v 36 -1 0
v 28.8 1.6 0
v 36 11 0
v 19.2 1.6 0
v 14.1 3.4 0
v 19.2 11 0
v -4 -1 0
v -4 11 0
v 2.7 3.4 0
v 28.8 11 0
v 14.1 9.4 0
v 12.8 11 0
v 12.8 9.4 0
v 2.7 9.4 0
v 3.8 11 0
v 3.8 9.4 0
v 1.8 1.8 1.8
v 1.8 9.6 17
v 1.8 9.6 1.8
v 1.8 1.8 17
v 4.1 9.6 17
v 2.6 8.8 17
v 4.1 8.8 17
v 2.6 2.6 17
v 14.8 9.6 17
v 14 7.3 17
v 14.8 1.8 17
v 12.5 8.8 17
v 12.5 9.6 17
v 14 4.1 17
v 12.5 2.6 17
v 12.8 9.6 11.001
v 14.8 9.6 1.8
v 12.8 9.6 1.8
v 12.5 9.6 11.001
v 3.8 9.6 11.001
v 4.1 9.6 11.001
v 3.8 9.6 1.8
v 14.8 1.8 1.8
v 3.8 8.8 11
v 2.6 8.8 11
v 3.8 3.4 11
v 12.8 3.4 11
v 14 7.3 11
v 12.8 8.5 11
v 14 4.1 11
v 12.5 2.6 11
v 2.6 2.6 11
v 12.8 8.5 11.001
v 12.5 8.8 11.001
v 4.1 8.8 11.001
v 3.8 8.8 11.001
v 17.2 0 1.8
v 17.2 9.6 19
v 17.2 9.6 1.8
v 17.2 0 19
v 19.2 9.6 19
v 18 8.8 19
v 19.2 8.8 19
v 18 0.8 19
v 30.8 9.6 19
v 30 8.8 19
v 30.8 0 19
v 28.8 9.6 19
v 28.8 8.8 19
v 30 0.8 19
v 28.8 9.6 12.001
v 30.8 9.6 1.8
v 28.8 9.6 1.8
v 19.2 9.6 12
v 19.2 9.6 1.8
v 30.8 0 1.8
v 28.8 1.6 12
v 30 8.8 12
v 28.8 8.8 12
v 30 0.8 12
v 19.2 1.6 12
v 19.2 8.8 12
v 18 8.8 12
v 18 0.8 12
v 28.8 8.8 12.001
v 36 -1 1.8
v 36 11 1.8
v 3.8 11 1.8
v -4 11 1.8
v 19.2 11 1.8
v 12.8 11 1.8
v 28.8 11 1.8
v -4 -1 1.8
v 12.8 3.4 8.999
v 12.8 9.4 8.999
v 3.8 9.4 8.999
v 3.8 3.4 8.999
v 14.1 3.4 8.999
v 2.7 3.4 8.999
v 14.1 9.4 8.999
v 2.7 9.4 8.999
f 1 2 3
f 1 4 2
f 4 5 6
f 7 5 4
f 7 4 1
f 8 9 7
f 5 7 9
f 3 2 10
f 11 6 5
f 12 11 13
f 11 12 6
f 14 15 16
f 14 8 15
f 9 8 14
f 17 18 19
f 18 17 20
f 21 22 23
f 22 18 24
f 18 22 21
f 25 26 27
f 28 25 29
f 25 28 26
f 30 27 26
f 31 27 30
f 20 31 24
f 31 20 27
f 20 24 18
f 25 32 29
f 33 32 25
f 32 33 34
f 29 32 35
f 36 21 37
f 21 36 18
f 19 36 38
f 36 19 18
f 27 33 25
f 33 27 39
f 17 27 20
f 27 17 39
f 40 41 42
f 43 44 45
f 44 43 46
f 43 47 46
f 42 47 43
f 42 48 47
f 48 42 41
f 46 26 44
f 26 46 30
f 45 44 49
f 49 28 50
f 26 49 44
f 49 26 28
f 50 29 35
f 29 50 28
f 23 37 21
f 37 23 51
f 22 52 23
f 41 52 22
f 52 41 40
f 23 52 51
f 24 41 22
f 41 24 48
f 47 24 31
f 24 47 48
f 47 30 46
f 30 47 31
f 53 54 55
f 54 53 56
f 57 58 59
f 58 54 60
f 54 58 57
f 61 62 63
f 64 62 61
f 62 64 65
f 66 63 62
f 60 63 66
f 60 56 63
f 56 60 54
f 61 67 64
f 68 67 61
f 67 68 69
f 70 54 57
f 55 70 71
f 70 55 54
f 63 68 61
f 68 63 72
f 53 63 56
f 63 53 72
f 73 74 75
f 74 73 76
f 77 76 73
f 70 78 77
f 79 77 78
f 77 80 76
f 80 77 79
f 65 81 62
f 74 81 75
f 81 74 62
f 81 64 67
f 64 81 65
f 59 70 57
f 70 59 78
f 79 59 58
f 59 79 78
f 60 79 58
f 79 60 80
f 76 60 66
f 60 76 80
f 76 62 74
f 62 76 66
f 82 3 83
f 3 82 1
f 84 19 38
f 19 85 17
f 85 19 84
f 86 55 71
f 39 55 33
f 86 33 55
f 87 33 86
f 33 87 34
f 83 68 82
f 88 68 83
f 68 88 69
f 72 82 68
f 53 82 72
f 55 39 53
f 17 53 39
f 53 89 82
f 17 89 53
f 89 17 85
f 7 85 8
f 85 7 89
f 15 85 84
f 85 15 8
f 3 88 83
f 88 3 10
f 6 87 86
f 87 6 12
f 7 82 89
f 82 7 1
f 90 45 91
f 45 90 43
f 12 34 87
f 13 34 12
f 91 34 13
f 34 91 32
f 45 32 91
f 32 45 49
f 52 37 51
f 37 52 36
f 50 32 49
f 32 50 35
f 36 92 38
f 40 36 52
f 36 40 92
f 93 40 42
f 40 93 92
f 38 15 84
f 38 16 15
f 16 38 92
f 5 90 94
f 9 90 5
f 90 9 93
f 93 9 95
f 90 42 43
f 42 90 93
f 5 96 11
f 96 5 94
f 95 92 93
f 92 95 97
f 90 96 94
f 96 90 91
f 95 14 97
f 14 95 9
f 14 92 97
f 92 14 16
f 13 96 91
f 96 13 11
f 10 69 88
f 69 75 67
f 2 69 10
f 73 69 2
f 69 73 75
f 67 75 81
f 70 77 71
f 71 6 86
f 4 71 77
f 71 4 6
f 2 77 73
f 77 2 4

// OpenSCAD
e=.001;
xt30_w=11.4;
xt30_h=6.2;
b=.8;
n=1.2;
xt30_n=1.5;

rj45_w=12;
rj45_h=8;


module keepout(w, h, b, n)
{
translate([0,0,12])
linear_extrude(8+e)
	translate([b,b])
	polygon([[0,0], [w,0], [w,h], [w-n,h], [w-n,h+b+e], [n,h+b+e], [n, h], [0,h]]);
}

module xt_keepout(w, h, b, n, ch)
{
translate([0,0,11])
linear_extrude(8+e)
	translate([b,b])
	polygon([[0,0], [w-ch,0], [w, ch], [w,h-ch], [w-n,h], [w-n,h+b+e], [n,h+b+e], [n, h], [0,h]]);
}


module xt_clam()
{
{
	difference()
	{
linear_extrude(17)
		square([xt30_w+b*2,xt30_h+b*2]);
		xt_keepout(xt30_w, xt30_h, b, xt30_n, xt30_n);
	}
}
}

module rj45_clam()
{
{
	difference()
	{
linear_extrude(19)
		square([rj45_w+b*2,rj45_h+b*2]);
		keepout(rj45_w, rj45_h, b, n);
	}
}
}

//cube([33,10,9+e]);
//translate([0,0,9])

difference()
{
union(){
translate([1.8,rj45_h-xt30_h])
xt_clam();
translate([17.2,0])
rj45_clam();
translate([-4,-1,0])
cube([40,12,1.8]);
}
union(){
translate([1.8+b+n,rj45_h-xt30_h+b*2,-e])
cube([xt30_w-2*n,12,e*2+11]);
translate([1.9+b,rj45_h-xt30_h+b*2,-e])
cube([xt30_w,6,9]);

translate([17.2+b+n,b*2,-e])
cube([rj45_w-2*n,12,e*2+12]);
}
}
